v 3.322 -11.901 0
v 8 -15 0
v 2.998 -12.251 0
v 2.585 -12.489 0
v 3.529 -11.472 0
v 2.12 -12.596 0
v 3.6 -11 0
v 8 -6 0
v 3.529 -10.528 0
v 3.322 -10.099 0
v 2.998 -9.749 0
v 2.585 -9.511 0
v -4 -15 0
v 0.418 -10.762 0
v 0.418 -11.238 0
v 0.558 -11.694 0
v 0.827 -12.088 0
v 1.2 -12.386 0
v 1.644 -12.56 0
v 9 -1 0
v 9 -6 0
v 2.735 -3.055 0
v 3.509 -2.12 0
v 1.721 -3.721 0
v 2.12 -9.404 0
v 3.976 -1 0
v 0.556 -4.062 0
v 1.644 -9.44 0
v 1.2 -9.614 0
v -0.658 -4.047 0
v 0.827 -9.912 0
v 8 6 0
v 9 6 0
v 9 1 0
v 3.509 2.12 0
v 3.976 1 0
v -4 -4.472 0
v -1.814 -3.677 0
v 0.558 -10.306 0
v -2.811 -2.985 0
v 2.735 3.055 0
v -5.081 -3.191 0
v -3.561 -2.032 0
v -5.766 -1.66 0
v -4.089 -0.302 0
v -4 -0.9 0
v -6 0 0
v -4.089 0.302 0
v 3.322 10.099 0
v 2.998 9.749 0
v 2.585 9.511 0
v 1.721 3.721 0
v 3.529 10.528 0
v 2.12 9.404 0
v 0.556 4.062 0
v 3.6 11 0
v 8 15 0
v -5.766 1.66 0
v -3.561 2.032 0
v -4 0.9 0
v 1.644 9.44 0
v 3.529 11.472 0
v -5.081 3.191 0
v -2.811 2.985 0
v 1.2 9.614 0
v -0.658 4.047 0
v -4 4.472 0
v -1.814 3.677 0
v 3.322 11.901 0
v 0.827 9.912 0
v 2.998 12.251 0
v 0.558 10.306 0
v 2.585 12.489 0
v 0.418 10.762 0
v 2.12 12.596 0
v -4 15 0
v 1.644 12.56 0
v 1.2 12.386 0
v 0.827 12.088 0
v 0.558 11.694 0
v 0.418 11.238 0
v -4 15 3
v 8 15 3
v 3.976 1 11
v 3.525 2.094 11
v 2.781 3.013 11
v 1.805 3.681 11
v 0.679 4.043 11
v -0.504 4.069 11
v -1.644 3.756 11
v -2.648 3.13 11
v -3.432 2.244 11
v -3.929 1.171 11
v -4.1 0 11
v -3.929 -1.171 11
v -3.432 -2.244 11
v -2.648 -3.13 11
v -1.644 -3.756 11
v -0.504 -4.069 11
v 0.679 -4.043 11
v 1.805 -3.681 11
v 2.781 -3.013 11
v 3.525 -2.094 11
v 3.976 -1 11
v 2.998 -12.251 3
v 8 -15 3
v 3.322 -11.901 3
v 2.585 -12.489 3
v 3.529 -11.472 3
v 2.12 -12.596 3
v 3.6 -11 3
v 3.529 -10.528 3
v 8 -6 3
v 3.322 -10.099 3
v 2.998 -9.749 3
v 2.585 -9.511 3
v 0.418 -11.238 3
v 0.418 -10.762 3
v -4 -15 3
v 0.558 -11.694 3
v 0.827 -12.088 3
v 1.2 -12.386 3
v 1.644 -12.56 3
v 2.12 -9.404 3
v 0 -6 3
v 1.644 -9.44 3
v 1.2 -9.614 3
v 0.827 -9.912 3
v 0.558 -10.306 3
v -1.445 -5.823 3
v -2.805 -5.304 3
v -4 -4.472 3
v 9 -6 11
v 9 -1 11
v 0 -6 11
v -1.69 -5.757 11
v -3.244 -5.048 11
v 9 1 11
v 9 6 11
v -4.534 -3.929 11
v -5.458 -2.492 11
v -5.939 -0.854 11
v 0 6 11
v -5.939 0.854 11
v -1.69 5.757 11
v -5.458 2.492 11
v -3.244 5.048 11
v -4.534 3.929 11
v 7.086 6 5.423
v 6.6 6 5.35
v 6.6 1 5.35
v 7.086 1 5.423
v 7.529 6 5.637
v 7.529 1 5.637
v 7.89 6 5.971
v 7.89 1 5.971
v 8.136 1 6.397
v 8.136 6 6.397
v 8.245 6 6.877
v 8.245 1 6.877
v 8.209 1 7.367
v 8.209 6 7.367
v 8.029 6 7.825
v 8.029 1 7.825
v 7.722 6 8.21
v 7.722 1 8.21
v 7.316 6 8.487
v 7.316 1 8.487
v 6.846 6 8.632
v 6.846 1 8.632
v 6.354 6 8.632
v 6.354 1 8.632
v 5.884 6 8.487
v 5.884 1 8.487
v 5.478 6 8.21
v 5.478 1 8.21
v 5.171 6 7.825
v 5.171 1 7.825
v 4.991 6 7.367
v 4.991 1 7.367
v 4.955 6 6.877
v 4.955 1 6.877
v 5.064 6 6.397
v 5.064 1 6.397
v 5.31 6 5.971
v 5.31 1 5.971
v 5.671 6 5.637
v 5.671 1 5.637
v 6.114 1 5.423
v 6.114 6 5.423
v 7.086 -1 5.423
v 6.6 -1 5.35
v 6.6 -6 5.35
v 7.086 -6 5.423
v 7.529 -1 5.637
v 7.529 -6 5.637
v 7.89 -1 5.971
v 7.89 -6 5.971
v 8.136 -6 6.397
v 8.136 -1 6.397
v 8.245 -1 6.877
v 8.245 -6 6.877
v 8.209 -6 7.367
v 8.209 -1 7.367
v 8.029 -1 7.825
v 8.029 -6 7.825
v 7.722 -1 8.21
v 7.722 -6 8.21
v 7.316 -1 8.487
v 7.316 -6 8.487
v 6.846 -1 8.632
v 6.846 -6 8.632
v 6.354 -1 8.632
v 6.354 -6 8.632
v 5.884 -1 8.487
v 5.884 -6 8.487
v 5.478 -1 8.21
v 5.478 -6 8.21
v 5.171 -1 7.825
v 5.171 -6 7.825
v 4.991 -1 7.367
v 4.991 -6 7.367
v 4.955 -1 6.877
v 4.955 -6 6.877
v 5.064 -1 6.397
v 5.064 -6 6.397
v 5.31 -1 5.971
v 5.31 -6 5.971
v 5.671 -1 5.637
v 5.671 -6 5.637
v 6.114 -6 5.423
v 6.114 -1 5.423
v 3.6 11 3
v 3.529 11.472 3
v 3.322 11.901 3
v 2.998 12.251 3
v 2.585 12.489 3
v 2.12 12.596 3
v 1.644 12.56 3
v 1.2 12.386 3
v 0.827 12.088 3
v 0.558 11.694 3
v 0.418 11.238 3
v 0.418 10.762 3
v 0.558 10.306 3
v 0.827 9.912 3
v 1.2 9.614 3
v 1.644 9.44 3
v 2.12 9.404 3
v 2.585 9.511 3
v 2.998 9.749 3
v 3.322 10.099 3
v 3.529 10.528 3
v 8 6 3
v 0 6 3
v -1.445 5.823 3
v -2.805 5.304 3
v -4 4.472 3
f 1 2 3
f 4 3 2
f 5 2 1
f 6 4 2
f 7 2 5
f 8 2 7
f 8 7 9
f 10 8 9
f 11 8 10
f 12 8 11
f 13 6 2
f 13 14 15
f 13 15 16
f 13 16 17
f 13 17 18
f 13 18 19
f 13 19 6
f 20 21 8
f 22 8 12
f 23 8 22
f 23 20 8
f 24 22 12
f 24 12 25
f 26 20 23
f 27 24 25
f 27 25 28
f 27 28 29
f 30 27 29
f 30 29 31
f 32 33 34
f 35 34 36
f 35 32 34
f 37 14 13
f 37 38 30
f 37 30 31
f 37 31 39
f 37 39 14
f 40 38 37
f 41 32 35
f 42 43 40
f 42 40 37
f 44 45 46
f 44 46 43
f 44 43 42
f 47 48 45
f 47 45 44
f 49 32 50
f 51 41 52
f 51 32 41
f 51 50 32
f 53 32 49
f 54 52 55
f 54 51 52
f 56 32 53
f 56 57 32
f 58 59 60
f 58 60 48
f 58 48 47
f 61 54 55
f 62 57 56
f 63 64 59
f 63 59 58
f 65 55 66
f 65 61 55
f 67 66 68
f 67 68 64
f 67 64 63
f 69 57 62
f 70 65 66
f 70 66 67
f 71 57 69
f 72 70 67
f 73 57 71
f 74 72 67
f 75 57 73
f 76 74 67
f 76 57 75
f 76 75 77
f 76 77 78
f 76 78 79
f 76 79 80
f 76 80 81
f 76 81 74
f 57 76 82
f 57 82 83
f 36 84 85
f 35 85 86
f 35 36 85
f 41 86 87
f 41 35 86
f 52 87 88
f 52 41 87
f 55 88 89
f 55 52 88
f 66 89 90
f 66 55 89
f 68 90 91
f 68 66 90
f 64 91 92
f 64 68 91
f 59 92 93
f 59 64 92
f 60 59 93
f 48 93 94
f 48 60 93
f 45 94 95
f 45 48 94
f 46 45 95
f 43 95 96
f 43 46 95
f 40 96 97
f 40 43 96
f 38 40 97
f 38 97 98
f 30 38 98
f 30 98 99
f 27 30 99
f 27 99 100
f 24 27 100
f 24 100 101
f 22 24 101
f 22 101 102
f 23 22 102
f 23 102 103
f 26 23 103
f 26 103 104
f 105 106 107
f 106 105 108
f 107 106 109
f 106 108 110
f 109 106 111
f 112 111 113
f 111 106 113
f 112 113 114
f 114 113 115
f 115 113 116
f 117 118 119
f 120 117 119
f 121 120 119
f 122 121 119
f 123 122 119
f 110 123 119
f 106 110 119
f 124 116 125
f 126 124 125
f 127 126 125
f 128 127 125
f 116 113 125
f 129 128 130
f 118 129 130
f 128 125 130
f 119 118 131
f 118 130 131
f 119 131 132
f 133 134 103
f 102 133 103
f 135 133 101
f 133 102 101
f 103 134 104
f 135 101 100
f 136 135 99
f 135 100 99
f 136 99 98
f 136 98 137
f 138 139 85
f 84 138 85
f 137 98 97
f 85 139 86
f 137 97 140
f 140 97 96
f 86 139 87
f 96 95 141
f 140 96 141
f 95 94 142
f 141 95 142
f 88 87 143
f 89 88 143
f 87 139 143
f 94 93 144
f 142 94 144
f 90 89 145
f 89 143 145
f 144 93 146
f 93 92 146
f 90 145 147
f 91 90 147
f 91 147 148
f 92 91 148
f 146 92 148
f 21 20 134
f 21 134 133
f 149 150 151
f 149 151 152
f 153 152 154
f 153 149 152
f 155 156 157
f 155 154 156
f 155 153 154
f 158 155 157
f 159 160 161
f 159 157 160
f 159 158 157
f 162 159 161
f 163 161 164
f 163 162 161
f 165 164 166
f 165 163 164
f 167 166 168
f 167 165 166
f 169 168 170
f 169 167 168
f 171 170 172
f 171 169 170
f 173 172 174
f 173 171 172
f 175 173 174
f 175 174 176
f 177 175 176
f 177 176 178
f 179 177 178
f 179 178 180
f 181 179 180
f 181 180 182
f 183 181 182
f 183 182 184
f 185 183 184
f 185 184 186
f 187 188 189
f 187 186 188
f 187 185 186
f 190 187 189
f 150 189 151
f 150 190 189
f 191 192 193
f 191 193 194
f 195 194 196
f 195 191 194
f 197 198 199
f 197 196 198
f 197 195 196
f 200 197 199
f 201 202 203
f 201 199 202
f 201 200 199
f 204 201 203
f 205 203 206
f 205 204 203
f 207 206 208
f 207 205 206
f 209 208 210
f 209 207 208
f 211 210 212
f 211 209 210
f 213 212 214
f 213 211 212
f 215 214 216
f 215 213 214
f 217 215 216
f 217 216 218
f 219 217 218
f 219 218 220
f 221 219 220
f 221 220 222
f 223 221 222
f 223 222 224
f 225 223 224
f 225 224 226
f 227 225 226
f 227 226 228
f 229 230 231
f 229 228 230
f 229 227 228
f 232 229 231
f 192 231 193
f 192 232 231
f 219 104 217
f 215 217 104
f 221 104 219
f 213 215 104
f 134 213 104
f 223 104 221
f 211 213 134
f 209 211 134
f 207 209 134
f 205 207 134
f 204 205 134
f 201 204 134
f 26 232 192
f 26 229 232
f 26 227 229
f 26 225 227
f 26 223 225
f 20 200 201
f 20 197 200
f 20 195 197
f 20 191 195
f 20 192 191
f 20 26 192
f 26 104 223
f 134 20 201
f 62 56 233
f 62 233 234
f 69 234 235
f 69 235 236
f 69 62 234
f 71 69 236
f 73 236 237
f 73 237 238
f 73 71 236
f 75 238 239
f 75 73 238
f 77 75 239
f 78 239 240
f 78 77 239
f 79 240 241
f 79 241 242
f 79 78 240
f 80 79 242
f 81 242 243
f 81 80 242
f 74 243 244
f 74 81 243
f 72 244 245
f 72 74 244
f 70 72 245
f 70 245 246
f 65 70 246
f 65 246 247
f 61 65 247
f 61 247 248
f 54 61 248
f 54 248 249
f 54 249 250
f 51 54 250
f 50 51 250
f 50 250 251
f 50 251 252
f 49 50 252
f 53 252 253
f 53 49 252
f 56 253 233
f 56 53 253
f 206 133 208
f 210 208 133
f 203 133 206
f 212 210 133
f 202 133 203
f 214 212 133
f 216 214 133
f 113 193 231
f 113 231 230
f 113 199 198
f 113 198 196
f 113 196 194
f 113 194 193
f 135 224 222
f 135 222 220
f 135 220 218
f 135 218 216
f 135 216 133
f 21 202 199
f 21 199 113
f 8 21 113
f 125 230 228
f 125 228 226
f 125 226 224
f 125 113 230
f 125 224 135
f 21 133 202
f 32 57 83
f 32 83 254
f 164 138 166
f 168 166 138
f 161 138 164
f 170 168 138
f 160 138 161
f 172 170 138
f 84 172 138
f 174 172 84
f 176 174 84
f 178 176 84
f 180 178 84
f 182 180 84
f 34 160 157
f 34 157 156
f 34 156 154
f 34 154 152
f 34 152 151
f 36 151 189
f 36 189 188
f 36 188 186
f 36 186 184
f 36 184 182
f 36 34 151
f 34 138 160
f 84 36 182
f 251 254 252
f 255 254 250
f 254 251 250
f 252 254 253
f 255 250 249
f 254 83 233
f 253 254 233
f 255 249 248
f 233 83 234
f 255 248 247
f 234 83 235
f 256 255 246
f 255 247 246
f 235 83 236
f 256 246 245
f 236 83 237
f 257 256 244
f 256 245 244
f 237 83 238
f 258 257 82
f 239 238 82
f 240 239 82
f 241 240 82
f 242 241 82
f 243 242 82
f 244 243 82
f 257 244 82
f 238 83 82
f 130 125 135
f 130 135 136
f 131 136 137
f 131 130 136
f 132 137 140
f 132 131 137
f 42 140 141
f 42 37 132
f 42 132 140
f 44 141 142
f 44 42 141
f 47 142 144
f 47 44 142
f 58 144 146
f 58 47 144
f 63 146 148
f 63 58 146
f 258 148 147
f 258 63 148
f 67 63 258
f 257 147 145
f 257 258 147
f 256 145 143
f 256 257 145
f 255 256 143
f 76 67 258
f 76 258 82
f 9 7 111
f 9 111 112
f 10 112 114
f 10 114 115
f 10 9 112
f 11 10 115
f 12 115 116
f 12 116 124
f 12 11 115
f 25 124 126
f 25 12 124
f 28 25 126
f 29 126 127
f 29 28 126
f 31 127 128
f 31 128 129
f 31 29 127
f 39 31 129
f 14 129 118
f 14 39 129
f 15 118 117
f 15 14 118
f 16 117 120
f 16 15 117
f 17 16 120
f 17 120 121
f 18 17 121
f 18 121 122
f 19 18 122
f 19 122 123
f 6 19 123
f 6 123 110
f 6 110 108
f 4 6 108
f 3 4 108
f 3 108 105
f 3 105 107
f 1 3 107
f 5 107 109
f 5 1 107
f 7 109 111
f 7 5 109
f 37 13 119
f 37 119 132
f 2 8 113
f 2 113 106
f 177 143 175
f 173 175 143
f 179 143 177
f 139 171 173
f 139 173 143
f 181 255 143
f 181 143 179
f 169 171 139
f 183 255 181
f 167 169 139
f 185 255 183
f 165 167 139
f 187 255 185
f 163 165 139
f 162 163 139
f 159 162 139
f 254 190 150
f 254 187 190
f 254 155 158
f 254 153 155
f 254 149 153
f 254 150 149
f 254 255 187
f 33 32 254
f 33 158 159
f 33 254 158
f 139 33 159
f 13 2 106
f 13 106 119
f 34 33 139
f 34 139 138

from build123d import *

# Parameters (mm, degrees)
ESBO_O1_R                     = 1.6
RESSALTO_EXTRUS_O1_DEPTH      = 3
RESSALTO_EXTRUS_O1_2_DEPTH    = 3
RESSALTO_EXTRUS_O2_DEPTH      = 8
RESSALTO_EXTRUS_O2_DEPTH_BACK = 3
CORTE_EXTRUS_O1_DEPTH         = 26.357444666
CORTE_EXTRUS_O1_DEPTH_BACK    = 26.357444666
ESBO_O3_R                     = 1.65


with BuildPart() as part:
    # Esboço1 → Ressalto-extrusão1 (new body)
    with BuildSketch(Plane.XY):
        with BuildLine():
            ThreePointArc((-4, -0.9), (-0.051399019, -4.099677809), (3.97617907, -1))
            Line((3.97617907, -1), (8, -1))
            Line((8, -1), (8, -15))
            Line((8, -15), (-4, -15))
            Line((-4, -15), (-4, -0.9))
        make_face()
        with Locations((2, -11)):
            Circle(ESBO_O1_R, mode=Mode.SUBTRACT)
    extrude(amount=RESSALTO_EXTRUS_O1_DEPTH)



with BuildPart() as body_2:
    # Esboço1 → Ressalto-extrus_o1 2 (new body)
    with BuildSketch(Plane.XY):
        with BuildLine():
            ThreePointArc((3.97617907, 1), (-0.051399019, 4.099677809), (-4, 0.9))
            Line((-4, 0.9), (-4, 15))
            Line((-4, 15), (8, 15))
            Line((8, 15), (8, 1))
            Line((8, 1), (3.97617907, 1))
        make_face()
        with Locations((2, 11)):
            Circle(ESBO_O1_R, mode=Mode.SUBTRACT)
    extrude(amount=RESSALTO_EXTRUS_O1_2_DEPTH)


with BuildPart() as part_1:
    add(part.part)

    add(body_2.part)  # Ressalto-extrusão2 merges body 2
    # Esboço2 → Ressalto-extrusão2 (add, two sides: drawn at the far end of the back side and taken through both)
    with BuildSketch(Plane.XY.offset(3).offset(-RESSALTO_EXTRUS_O2_DEPTH_BACK)):
        with BuildLine():
            Line((9, 6), (9, 1))
            Line((9, 1), (3.97617907, 1))
            ThreePointArc((3.97617907, 1), (-4.1, 0), (3.97617907, -1))
            Line((3.97617907, -1), (9, -1))
            Line((9, -1), (9, -6))
            Line((9, -6), (0, -6))
            ThreePointArc((0, -6), (-6, 0), (0, 6))
            Line((0, 6), (9, 6))
        make_face()
    extrude(amount=RESSALTO_EXTRUS_O2_DEPTH + RESSALTO_EXTRUS_O2_DEPTH_BACK)

    # Esboço3 → Corte-extrusão1 (cut, two sides: drawn at the far end of the back side and taken through both)
    with BuildSketch(Plane.XZ.offset(-6).offset(-CORTE_EXTRUS_O1_DEPTH_BACK)):
        with Locations(Location((6.6, 7, 0), (0, 0, 270))):
            Circle(ESBO_O3_R)
    extrude(amount=CORTE_EXTRUS_O1_DEPTH + CORTE_EXTRUS_O1_DEPTH_BACK, mode=Mode.SUBTRACT)


solid = part_1.part
